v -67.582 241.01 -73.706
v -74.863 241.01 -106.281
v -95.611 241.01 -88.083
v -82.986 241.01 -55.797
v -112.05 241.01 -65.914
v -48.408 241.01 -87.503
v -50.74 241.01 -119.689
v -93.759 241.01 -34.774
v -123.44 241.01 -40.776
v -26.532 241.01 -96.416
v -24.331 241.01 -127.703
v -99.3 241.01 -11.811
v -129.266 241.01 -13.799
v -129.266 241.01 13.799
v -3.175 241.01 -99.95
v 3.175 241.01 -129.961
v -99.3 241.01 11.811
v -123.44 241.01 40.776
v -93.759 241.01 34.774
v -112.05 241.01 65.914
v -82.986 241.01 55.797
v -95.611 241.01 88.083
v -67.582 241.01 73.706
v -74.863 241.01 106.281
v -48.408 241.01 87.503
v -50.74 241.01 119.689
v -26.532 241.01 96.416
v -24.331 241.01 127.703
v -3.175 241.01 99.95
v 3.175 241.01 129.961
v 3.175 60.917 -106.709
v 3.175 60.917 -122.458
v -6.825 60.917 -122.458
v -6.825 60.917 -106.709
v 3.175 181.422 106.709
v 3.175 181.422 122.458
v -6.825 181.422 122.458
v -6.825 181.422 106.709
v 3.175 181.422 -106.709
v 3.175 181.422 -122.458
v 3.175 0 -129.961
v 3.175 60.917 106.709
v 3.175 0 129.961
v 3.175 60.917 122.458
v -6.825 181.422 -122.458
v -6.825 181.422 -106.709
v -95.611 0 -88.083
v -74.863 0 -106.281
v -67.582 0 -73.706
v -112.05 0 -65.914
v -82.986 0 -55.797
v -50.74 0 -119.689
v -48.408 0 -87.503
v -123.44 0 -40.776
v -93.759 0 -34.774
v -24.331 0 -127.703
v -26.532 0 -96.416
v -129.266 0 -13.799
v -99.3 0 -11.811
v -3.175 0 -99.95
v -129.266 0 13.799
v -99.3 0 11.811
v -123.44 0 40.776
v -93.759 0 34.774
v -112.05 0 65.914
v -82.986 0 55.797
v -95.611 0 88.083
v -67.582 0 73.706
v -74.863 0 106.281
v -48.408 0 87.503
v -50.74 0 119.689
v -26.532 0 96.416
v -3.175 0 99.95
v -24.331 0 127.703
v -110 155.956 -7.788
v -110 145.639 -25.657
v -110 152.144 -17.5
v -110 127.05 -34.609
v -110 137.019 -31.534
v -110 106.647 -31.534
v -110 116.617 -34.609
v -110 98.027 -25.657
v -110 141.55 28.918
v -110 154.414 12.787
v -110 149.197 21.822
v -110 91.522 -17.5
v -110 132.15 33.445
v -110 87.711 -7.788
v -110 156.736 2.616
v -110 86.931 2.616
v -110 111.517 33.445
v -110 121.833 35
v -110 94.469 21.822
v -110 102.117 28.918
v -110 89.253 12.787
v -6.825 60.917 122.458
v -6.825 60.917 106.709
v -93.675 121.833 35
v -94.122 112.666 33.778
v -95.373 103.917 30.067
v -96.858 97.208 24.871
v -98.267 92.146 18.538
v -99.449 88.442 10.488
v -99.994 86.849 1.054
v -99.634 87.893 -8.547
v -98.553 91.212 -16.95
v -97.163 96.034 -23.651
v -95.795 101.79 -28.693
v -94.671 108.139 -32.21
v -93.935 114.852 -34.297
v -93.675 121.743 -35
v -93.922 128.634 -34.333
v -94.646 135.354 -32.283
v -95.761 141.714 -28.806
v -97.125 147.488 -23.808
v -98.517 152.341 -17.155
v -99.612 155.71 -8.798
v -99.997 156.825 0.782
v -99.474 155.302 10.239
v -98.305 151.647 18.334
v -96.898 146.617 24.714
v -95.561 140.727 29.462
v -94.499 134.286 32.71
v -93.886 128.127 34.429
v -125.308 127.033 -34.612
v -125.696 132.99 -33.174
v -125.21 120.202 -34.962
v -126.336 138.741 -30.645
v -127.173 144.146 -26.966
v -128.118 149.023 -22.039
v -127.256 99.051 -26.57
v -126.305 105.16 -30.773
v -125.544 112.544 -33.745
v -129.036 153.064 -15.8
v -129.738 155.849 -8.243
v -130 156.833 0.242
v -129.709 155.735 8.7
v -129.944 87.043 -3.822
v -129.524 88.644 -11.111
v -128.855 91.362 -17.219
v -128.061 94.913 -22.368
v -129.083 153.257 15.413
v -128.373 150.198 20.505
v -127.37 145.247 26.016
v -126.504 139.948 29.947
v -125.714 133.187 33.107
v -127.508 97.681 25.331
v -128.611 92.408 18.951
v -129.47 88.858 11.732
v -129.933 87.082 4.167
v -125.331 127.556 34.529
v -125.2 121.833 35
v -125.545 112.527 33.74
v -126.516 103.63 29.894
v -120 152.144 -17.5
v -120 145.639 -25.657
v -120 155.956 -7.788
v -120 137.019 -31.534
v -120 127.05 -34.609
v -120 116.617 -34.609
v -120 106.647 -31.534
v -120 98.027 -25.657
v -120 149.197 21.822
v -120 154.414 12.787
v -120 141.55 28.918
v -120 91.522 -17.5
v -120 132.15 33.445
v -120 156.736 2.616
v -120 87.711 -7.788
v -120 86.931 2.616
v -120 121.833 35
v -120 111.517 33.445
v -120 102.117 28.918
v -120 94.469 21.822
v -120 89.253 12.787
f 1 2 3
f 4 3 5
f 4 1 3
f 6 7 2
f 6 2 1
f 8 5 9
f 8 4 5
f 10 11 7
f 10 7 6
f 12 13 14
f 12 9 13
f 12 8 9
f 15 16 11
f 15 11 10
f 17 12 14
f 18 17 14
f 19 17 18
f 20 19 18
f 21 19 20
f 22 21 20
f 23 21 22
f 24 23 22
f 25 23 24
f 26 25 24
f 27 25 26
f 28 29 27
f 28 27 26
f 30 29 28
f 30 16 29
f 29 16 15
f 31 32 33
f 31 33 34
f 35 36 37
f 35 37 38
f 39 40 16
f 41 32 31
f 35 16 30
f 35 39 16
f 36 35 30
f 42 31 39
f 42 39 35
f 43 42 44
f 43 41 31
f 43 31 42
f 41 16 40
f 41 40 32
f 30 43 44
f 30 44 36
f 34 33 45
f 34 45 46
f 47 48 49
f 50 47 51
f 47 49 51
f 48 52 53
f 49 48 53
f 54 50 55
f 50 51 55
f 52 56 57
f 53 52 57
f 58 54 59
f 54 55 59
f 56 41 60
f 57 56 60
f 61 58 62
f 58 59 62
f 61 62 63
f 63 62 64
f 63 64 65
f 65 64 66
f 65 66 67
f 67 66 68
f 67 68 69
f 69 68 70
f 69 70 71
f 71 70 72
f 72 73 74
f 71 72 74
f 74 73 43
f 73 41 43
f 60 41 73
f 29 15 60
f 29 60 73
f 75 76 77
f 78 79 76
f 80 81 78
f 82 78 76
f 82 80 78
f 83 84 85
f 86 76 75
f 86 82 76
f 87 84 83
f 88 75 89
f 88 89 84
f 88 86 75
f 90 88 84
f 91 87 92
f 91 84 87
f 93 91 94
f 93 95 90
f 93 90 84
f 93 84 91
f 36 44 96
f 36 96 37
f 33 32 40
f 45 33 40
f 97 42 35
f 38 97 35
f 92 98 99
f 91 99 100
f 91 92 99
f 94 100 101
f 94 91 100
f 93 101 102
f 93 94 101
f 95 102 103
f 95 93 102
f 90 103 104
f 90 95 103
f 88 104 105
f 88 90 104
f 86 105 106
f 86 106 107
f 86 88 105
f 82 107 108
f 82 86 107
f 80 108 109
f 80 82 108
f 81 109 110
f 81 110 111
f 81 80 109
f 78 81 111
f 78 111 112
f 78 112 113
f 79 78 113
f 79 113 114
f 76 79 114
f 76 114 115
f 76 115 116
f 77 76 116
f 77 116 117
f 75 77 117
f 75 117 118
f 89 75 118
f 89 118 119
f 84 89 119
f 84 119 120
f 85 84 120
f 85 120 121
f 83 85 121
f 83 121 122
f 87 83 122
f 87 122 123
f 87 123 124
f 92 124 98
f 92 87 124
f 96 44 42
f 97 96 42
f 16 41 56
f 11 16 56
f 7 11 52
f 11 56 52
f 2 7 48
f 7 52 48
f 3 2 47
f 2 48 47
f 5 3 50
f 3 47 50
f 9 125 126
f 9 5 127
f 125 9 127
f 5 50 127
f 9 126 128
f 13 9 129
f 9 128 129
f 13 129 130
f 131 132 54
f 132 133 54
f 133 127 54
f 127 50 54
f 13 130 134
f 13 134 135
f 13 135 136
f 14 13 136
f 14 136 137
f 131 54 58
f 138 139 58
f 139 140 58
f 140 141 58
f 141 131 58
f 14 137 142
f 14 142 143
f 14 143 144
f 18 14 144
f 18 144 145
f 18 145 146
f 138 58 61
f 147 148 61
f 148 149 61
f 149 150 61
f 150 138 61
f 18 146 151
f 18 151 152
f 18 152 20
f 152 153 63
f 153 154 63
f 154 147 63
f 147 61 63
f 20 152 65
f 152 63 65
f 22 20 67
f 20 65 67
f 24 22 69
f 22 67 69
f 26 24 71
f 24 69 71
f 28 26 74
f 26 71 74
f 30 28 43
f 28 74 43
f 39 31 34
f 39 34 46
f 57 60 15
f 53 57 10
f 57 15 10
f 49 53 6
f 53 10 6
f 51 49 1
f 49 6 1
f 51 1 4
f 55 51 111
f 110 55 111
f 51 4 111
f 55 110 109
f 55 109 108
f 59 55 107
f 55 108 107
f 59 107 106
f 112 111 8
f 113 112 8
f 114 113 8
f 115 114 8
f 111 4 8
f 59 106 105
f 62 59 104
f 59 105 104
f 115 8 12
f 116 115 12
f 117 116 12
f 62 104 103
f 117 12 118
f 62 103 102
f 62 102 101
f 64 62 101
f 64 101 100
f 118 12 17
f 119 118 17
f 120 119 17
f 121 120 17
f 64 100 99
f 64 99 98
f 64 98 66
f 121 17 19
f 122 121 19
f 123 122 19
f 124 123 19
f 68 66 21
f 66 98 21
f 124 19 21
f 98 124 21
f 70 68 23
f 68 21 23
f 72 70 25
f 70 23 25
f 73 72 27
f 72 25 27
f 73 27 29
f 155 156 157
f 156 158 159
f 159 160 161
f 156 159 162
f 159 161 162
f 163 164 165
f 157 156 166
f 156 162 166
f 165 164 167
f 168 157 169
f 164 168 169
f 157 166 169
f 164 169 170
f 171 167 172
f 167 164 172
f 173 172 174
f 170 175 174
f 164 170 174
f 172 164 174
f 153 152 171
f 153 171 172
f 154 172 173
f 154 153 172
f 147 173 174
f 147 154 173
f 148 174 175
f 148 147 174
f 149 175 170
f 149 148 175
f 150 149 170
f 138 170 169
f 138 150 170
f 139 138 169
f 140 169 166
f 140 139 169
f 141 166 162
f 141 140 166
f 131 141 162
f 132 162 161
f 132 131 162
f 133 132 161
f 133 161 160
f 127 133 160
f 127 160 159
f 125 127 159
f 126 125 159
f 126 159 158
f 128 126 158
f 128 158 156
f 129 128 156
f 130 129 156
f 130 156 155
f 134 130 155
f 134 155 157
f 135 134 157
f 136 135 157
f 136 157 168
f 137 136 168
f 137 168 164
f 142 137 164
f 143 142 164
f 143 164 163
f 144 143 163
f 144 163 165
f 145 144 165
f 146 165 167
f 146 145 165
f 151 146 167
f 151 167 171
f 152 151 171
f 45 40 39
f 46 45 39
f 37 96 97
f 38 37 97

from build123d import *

# Parameters (mm, degrees)
SKETCH1_R                = 130
BOSS_EXTRUDE1_DEPTH      = 241.01
SKETCH2_R                = 100
CUT_EXTRUDE1_DEPTH       = 304.126739335
BOSS_EXTRUDE2_DEPTH      = 241.01
BODY_DELETE_KEEP_1_DEPTH = 241.01
SKETCH8_R                = 35
CUT_EXTRUDE2_DEPTH       = 10
CUT_EXTRUDE9_DEPTH       = 10
CUT_EXTRUDE9_DEPTH_BACK  = 10
SKETCH10_R               = 35
SKETCH16_W               = 15.74894652
SKETCH16_H               = 120.505
CUT_EXTRUDE10_DEPTH      = 10


# Read off the part's stored shape, not the designer's step: Body-Delete/Keep 1
with BuildPart() as part:
    # Sketch1 → Boss-Extrude1 (new body)
    with BuildSketch(Plane(origin=(0, 0, 0), x_dir=(1, 0, 0), z_dir=(0, 1, 0))):
        with Locations(Location((0, 0, 0), (0, 0, 270))):
            Circle(SKETCH1_R)
    extrude(amount=BOSS_EXTRUDE1_DEPTH)

    # Sketch2 → Cut-Extrude1 (cut, through all)
    with BuildSketch(Plane(origin=(0, 241.01, 0), x_dir=(1, 0, 0), z_dir=(0, 1, 0))):
        with Locations(Location((0, 0, 0), (0, 0, 270))):
            Circle(SKETCH2_R)
    extrude(amount=-CUT_EXTRUDE1_DEPTH, mode=Mode.SUBTRACT)


with BuildPart() as body_2:
    # Sketch5 → Boss-Extrude2 (new body)
    with BuildSketch(Plane(origin=(0, 0, 0), x_dir=(1, 0, 0), z_dir=(0, 1, 0))):
        Polygon((-3.175, -0.773064833), (-3.175, 104.496382322), (3.175, 104.496382322), (3.175, 0), (3.175, -106.678671161), (-3.175, -106.678671161), align=None)
    extrude(amount=BOSS_EXTRUDE2_DEPTH)


with BuildPart() as body_3:
    # Split1: the piece on the far side of the plane
    add(part.part)
    split(bisect_by=Plane(origin=(3.175, 0, 0), x_dir=(0, 0, 1), z_dir=(1, 0, 0)), keep=Keep.BOTTOM)

    # Combine2: union body 2
    add(body_2.part)

    # Sketch8 → Cut-Extrude2 (cut)
    with BuildSketch(Plane(origin=(-130, 0, 0), x_dir=(0, 0, -1), z_dir=(1, 0, 0))):
        with Locations(Location((0, 121.833368443, 0), (0, 0, 180))):
            Circle(SKETCH8_R)
    extrude(amount=CUT_EXTRUDE2_DEPTH, mode=Mode.SUBTRACT)

    # Sketch10 → Cut-Extrude9 (cut, two sides: drawn at the far end of the back side and taken through both)
    with BuildSketch(Plane(origin=(-100, 0, 0), x_dir=(0, 0, -1), z_dir=(1, 0, 0)).offset(-CUT_EXTRUDE9_DEPTH_BACK)):
        with Locations(Location((0, 121.833368443, 0), (0, 0, 180))):
            Circle(SKETCH10_R)
    extrude(amount=CUT_EXTRUDE9_DEPTH + CUT_EXTRUDE9_DEPTH_BACK, mode=Mode.SUBTRACT)

    # Sketch16 → Cut-Extrude10 (cut)
    with BuildSketch(Plane(origin=(3.175, 0, 0), x_dir=(0, 0, -1), z_dir=(1, 0, 0))):
        with Locations((-114.583839718, 121.169184221)):
            Rectangle(SKETCH16_W, SKETCH16_H)
    cut_extrude10 = extrude(amount=-CUT_EXTRUDE10_DEPTH, mode=Mode.SUBTRACT)

    # Mirror1: Cut-Extrude10 across plane
    add(cut_extrude10.mirror(Plane.XY), mode=Mode.SUBTRACT)


with BuildPart() as part_1:
    add(part.part)

    # Split1
    split(bisect_by=Plane(origin=(3.175, 0, 0), x_dir=(0, 0, 1), z_dir=(1, 0, 0)), keep=Keep.TOP)

    # Body-Delete/Keep 1 outline → Body-Delete/Keep 1 (cut)
    with BuildSketch(Plane(origin=(0, 0, 0), x_dir=(1, 0, 0), z_dir=(0, 1, 0))):
        with BuildLine():
            ThreePointArc((3.175, -129.961222582), (130, 0), (3.175, 129.961222582))
            Line((3.175, 129.961222582), (3.175, 99.949584166))
            ThreePointArc((3.175, 99.949584166), (100, 0), (3.175, -99.949584166))
            Line((3.175, -99.949584166), (3.175, -129.961222582))
        make_face()
    extrude(amount=BODY_DELETE_KEEP_1_DEPTH, mode=Mode.SUBTRACT)


solid = body_3.part
